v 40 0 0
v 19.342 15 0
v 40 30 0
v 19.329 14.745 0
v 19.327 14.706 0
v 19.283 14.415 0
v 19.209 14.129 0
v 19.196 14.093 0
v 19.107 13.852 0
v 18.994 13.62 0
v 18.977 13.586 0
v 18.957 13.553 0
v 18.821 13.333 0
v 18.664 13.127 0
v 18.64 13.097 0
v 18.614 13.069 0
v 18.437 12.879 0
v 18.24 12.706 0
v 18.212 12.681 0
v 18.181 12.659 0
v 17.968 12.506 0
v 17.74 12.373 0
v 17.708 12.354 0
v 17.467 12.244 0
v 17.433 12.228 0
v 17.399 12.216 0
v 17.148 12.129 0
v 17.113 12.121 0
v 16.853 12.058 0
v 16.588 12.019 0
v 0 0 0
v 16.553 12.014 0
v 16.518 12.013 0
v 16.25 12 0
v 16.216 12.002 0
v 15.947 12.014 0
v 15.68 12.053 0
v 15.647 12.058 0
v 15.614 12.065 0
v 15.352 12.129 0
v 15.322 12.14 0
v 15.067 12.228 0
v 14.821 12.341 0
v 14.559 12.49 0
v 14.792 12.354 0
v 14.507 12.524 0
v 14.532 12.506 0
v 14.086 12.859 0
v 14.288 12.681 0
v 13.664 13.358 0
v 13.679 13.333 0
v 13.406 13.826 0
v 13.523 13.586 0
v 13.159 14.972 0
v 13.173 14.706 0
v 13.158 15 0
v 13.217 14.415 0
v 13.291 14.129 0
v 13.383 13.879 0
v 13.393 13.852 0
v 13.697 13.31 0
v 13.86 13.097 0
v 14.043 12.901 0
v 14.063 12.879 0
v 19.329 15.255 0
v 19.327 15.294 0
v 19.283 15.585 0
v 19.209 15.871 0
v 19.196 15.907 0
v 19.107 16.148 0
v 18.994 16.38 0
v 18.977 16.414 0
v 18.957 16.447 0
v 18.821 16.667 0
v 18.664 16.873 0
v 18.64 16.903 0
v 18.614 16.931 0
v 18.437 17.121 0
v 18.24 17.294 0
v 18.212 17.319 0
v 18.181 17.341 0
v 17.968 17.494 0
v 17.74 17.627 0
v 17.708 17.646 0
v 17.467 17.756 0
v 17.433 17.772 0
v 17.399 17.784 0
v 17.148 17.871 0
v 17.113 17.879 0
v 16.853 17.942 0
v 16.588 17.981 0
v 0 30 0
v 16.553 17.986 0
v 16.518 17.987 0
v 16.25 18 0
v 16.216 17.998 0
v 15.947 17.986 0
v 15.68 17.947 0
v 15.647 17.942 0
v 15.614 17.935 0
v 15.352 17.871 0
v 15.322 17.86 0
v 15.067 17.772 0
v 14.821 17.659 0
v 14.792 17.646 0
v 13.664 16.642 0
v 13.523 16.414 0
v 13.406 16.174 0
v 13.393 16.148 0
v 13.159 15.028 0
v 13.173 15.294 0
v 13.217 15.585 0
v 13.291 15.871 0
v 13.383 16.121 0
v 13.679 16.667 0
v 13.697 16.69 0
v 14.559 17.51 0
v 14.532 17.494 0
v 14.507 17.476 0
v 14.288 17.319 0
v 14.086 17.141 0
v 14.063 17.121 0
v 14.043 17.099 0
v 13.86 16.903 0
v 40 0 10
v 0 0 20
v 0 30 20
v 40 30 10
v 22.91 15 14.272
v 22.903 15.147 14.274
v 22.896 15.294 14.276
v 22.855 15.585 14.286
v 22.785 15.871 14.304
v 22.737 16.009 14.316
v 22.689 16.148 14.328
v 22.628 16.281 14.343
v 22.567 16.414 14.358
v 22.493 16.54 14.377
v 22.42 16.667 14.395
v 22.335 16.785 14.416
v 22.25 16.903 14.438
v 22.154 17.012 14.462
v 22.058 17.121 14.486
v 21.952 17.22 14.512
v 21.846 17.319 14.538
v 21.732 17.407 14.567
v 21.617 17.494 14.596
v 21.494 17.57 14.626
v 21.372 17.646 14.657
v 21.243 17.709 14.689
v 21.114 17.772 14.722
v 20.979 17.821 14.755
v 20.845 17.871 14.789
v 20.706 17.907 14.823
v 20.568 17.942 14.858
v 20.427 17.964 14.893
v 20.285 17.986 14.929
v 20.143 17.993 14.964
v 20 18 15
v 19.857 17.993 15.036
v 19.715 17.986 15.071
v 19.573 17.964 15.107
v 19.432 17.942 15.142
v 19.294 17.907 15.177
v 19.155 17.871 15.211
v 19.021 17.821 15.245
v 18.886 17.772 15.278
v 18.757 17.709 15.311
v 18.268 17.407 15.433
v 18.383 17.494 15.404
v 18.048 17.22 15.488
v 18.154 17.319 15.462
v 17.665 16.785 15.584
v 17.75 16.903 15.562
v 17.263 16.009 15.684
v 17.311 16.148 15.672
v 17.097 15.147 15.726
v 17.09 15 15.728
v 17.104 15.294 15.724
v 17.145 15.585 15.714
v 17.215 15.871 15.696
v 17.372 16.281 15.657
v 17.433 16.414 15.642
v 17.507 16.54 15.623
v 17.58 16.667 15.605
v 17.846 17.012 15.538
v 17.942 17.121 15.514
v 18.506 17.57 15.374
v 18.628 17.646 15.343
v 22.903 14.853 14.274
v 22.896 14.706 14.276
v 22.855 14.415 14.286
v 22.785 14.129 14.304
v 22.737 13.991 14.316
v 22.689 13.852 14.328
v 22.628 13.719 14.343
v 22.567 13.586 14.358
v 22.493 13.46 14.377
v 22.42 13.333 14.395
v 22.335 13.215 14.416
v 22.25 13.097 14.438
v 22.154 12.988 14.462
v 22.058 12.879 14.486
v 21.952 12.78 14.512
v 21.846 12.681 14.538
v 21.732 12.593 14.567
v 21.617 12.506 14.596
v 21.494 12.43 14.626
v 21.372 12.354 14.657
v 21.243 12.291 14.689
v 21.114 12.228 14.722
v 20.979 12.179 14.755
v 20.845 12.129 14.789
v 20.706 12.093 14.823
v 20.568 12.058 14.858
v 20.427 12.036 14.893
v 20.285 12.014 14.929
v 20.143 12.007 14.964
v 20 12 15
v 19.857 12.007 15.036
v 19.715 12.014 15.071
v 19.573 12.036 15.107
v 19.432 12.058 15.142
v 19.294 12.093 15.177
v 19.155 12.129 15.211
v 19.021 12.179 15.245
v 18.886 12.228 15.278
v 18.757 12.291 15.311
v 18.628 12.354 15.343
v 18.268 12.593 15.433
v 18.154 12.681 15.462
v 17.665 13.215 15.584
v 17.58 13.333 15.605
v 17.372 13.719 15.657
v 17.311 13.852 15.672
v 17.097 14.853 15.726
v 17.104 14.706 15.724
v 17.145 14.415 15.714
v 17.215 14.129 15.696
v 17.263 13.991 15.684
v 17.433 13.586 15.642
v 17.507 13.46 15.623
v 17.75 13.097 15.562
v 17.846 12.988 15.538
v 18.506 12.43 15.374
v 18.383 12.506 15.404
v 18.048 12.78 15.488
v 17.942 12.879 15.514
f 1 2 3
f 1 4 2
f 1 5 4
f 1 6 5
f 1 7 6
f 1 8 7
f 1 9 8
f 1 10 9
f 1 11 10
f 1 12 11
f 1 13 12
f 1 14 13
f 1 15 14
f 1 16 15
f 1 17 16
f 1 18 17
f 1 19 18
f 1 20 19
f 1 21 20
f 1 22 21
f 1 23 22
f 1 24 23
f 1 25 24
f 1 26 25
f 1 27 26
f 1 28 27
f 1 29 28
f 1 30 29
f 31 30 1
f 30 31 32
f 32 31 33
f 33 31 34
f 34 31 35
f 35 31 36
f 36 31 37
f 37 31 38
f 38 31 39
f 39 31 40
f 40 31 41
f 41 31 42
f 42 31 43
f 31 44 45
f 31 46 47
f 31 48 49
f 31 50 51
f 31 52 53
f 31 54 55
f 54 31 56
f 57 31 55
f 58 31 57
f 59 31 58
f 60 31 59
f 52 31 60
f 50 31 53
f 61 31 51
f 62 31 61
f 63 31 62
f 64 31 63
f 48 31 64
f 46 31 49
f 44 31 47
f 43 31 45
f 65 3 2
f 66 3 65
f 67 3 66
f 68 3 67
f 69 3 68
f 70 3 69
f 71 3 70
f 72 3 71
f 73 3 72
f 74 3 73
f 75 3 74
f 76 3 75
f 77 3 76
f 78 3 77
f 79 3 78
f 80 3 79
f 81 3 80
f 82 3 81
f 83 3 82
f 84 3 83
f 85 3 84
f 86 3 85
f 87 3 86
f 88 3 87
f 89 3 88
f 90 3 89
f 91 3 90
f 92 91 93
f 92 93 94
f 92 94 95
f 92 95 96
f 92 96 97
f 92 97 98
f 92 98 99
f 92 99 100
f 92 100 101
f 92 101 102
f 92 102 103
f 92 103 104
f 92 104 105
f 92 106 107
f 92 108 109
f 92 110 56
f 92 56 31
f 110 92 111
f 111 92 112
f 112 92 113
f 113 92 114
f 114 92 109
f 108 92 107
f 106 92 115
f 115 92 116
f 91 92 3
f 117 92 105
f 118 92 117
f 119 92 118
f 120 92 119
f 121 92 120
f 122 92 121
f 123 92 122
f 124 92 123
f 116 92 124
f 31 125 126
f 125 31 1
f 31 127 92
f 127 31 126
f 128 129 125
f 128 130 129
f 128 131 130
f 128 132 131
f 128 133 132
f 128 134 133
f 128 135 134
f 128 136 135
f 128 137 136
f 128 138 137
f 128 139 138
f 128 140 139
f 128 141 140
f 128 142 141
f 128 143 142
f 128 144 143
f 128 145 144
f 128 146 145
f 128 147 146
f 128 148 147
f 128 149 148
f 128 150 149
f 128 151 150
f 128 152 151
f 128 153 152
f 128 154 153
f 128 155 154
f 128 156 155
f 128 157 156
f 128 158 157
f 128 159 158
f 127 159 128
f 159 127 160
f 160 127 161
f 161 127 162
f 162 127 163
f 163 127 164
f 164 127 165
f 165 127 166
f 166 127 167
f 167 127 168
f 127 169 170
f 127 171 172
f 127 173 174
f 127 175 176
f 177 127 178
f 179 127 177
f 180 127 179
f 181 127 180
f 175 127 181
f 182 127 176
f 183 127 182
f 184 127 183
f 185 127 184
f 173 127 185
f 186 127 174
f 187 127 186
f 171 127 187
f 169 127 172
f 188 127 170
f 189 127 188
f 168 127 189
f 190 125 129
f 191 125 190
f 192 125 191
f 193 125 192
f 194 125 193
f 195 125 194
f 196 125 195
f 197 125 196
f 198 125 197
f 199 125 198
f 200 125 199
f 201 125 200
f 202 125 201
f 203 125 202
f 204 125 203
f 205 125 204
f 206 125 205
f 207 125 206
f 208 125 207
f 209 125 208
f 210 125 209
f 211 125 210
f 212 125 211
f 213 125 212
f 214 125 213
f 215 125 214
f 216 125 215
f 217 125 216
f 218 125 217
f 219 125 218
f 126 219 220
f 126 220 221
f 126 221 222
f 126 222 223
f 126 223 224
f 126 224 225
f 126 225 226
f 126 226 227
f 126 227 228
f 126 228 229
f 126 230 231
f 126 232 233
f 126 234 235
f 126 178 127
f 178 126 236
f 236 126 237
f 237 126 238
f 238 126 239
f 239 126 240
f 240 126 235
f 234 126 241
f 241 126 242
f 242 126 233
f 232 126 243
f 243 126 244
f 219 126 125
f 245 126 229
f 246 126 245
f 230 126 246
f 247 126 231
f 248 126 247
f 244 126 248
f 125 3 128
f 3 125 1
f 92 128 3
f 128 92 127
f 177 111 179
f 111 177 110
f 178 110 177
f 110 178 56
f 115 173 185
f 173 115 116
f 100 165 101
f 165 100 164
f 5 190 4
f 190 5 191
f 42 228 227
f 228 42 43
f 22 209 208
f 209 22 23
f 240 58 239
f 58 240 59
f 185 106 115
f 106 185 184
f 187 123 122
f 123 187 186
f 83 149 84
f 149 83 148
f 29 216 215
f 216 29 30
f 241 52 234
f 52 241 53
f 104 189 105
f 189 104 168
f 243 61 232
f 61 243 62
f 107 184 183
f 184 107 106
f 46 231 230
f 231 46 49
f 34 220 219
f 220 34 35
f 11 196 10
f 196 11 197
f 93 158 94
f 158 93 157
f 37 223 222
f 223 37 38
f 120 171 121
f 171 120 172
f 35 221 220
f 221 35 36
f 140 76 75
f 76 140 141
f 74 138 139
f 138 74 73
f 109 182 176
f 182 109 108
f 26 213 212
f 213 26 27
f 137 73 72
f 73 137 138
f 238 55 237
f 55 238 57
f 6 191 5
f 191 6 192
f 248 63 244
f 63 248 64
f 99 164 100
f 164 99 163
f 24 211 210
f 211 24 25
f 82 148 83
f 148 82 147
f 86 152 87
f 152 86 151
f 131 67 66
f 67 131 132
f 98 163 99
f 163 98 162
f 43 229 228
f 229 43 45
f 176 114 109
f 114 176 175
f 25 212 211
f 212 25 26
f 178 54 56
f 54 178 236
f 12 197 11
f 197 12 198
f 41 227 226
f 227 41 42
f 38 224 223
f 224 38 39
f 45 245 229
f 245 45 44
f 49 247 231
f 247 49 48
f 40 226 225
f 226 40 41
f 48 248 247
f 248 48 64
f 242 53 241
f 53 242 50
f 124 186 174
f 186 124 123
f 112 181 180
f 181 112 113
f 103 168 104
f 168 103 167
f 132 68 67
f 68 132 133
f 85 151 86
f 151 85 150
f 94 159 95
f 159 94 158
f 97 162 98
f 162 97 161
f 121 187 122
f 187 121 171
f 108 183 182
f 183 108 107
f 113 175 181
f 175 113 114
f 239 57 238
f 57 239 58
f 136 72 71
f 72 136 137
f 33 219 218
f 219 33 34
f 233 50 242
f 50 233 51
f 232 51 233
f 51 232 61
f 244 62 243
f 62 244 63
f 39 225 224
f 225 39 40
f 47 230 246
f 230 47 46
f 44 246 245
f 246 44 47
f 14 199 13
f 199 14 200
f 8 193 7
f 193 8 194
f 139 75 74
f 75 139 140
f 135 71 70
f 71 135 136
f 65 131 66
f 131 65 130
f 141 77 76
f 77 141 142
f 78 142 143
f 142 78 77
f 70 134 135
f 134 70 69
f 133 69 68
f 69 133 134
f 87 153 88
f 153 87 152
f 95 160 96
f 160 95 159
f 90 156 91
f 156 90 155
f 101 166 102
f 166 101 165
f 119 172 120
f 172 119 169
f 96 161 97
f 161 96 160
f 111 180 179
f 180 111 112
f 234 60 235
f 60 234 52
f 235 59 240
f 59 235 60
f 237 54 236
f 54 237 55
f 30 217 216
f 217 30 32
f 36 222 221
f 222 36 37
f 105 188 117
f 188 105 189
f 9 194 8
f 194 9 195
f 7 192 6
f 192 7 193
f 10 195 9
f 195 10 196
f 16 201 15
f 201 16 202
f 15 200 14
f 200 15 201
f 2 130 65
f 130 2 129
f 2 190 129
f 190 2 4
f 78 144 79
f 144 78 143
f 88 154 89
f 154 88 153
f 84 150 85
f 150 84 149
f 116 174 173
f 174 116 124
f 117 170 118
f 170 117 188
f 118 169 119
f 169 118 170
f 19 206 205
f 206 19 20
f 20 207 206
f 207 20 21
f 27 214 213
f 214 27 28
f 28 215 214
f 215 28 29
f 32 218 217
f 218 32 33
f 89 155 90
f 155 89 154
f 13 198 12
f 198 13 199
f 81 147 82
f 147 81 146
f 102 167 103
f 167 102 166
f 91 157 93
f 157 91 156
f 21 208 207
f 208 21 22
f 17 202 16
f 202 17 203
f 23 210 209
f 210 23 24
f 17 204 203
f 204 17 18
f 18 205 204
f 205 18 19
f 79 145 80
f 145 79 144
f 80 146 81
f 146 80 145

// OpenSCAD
$fn = 64;

// Primary envelope
foot_x = 40;
foot_y = 30;
top_z_at_x0 = 20;
top_z_at_x40 = 10;

// Drilled feature
hole_d = 6;
hole_x = 20;
hole_y = 15;
hole_z = 15;

// Inclined top: z = top_z_at_x0 - x * (top_z_at_x0 - top_z_at_x40) / foot_x
slope_drop = top_z_at_x0 - top_z_at_x40;
top_slope = slope_drop / foot_x;
hole_axis_tilt_deg = atan2(-1, -1 / top_slope);

module wedge() {
    // Extruded x-z side profile, spanning y = 0..foot_y.
    // Rotate the default +Z extrusion onto -Y and shift it to y=0..foot_y.
    translate([0, foot_y, 0])
        rotate([90, 0, 0])
            linear_extrude(height = foot_y)
            polygon([
                [0, 0],
                [foot_x, 0],
                [foot_x, top_z_at_x40],
                [0, top_z_at_x0]
            ]);
}

module inclined_hole() {
    // Axis is perpendicular to the top plane, directed into the part.
    // The cylinder is centered on the requested entry point and overlong
    // so it cuts completely through the bottom face.
    translate([hole_x, hole_y, hole_z])
        rotate([0, hole_axis_tilt_deg, 0])
            cylinder(h = 40, d = hole_d, center = true);
}

difference() {
    wedge();
    inclined_hole();
}
